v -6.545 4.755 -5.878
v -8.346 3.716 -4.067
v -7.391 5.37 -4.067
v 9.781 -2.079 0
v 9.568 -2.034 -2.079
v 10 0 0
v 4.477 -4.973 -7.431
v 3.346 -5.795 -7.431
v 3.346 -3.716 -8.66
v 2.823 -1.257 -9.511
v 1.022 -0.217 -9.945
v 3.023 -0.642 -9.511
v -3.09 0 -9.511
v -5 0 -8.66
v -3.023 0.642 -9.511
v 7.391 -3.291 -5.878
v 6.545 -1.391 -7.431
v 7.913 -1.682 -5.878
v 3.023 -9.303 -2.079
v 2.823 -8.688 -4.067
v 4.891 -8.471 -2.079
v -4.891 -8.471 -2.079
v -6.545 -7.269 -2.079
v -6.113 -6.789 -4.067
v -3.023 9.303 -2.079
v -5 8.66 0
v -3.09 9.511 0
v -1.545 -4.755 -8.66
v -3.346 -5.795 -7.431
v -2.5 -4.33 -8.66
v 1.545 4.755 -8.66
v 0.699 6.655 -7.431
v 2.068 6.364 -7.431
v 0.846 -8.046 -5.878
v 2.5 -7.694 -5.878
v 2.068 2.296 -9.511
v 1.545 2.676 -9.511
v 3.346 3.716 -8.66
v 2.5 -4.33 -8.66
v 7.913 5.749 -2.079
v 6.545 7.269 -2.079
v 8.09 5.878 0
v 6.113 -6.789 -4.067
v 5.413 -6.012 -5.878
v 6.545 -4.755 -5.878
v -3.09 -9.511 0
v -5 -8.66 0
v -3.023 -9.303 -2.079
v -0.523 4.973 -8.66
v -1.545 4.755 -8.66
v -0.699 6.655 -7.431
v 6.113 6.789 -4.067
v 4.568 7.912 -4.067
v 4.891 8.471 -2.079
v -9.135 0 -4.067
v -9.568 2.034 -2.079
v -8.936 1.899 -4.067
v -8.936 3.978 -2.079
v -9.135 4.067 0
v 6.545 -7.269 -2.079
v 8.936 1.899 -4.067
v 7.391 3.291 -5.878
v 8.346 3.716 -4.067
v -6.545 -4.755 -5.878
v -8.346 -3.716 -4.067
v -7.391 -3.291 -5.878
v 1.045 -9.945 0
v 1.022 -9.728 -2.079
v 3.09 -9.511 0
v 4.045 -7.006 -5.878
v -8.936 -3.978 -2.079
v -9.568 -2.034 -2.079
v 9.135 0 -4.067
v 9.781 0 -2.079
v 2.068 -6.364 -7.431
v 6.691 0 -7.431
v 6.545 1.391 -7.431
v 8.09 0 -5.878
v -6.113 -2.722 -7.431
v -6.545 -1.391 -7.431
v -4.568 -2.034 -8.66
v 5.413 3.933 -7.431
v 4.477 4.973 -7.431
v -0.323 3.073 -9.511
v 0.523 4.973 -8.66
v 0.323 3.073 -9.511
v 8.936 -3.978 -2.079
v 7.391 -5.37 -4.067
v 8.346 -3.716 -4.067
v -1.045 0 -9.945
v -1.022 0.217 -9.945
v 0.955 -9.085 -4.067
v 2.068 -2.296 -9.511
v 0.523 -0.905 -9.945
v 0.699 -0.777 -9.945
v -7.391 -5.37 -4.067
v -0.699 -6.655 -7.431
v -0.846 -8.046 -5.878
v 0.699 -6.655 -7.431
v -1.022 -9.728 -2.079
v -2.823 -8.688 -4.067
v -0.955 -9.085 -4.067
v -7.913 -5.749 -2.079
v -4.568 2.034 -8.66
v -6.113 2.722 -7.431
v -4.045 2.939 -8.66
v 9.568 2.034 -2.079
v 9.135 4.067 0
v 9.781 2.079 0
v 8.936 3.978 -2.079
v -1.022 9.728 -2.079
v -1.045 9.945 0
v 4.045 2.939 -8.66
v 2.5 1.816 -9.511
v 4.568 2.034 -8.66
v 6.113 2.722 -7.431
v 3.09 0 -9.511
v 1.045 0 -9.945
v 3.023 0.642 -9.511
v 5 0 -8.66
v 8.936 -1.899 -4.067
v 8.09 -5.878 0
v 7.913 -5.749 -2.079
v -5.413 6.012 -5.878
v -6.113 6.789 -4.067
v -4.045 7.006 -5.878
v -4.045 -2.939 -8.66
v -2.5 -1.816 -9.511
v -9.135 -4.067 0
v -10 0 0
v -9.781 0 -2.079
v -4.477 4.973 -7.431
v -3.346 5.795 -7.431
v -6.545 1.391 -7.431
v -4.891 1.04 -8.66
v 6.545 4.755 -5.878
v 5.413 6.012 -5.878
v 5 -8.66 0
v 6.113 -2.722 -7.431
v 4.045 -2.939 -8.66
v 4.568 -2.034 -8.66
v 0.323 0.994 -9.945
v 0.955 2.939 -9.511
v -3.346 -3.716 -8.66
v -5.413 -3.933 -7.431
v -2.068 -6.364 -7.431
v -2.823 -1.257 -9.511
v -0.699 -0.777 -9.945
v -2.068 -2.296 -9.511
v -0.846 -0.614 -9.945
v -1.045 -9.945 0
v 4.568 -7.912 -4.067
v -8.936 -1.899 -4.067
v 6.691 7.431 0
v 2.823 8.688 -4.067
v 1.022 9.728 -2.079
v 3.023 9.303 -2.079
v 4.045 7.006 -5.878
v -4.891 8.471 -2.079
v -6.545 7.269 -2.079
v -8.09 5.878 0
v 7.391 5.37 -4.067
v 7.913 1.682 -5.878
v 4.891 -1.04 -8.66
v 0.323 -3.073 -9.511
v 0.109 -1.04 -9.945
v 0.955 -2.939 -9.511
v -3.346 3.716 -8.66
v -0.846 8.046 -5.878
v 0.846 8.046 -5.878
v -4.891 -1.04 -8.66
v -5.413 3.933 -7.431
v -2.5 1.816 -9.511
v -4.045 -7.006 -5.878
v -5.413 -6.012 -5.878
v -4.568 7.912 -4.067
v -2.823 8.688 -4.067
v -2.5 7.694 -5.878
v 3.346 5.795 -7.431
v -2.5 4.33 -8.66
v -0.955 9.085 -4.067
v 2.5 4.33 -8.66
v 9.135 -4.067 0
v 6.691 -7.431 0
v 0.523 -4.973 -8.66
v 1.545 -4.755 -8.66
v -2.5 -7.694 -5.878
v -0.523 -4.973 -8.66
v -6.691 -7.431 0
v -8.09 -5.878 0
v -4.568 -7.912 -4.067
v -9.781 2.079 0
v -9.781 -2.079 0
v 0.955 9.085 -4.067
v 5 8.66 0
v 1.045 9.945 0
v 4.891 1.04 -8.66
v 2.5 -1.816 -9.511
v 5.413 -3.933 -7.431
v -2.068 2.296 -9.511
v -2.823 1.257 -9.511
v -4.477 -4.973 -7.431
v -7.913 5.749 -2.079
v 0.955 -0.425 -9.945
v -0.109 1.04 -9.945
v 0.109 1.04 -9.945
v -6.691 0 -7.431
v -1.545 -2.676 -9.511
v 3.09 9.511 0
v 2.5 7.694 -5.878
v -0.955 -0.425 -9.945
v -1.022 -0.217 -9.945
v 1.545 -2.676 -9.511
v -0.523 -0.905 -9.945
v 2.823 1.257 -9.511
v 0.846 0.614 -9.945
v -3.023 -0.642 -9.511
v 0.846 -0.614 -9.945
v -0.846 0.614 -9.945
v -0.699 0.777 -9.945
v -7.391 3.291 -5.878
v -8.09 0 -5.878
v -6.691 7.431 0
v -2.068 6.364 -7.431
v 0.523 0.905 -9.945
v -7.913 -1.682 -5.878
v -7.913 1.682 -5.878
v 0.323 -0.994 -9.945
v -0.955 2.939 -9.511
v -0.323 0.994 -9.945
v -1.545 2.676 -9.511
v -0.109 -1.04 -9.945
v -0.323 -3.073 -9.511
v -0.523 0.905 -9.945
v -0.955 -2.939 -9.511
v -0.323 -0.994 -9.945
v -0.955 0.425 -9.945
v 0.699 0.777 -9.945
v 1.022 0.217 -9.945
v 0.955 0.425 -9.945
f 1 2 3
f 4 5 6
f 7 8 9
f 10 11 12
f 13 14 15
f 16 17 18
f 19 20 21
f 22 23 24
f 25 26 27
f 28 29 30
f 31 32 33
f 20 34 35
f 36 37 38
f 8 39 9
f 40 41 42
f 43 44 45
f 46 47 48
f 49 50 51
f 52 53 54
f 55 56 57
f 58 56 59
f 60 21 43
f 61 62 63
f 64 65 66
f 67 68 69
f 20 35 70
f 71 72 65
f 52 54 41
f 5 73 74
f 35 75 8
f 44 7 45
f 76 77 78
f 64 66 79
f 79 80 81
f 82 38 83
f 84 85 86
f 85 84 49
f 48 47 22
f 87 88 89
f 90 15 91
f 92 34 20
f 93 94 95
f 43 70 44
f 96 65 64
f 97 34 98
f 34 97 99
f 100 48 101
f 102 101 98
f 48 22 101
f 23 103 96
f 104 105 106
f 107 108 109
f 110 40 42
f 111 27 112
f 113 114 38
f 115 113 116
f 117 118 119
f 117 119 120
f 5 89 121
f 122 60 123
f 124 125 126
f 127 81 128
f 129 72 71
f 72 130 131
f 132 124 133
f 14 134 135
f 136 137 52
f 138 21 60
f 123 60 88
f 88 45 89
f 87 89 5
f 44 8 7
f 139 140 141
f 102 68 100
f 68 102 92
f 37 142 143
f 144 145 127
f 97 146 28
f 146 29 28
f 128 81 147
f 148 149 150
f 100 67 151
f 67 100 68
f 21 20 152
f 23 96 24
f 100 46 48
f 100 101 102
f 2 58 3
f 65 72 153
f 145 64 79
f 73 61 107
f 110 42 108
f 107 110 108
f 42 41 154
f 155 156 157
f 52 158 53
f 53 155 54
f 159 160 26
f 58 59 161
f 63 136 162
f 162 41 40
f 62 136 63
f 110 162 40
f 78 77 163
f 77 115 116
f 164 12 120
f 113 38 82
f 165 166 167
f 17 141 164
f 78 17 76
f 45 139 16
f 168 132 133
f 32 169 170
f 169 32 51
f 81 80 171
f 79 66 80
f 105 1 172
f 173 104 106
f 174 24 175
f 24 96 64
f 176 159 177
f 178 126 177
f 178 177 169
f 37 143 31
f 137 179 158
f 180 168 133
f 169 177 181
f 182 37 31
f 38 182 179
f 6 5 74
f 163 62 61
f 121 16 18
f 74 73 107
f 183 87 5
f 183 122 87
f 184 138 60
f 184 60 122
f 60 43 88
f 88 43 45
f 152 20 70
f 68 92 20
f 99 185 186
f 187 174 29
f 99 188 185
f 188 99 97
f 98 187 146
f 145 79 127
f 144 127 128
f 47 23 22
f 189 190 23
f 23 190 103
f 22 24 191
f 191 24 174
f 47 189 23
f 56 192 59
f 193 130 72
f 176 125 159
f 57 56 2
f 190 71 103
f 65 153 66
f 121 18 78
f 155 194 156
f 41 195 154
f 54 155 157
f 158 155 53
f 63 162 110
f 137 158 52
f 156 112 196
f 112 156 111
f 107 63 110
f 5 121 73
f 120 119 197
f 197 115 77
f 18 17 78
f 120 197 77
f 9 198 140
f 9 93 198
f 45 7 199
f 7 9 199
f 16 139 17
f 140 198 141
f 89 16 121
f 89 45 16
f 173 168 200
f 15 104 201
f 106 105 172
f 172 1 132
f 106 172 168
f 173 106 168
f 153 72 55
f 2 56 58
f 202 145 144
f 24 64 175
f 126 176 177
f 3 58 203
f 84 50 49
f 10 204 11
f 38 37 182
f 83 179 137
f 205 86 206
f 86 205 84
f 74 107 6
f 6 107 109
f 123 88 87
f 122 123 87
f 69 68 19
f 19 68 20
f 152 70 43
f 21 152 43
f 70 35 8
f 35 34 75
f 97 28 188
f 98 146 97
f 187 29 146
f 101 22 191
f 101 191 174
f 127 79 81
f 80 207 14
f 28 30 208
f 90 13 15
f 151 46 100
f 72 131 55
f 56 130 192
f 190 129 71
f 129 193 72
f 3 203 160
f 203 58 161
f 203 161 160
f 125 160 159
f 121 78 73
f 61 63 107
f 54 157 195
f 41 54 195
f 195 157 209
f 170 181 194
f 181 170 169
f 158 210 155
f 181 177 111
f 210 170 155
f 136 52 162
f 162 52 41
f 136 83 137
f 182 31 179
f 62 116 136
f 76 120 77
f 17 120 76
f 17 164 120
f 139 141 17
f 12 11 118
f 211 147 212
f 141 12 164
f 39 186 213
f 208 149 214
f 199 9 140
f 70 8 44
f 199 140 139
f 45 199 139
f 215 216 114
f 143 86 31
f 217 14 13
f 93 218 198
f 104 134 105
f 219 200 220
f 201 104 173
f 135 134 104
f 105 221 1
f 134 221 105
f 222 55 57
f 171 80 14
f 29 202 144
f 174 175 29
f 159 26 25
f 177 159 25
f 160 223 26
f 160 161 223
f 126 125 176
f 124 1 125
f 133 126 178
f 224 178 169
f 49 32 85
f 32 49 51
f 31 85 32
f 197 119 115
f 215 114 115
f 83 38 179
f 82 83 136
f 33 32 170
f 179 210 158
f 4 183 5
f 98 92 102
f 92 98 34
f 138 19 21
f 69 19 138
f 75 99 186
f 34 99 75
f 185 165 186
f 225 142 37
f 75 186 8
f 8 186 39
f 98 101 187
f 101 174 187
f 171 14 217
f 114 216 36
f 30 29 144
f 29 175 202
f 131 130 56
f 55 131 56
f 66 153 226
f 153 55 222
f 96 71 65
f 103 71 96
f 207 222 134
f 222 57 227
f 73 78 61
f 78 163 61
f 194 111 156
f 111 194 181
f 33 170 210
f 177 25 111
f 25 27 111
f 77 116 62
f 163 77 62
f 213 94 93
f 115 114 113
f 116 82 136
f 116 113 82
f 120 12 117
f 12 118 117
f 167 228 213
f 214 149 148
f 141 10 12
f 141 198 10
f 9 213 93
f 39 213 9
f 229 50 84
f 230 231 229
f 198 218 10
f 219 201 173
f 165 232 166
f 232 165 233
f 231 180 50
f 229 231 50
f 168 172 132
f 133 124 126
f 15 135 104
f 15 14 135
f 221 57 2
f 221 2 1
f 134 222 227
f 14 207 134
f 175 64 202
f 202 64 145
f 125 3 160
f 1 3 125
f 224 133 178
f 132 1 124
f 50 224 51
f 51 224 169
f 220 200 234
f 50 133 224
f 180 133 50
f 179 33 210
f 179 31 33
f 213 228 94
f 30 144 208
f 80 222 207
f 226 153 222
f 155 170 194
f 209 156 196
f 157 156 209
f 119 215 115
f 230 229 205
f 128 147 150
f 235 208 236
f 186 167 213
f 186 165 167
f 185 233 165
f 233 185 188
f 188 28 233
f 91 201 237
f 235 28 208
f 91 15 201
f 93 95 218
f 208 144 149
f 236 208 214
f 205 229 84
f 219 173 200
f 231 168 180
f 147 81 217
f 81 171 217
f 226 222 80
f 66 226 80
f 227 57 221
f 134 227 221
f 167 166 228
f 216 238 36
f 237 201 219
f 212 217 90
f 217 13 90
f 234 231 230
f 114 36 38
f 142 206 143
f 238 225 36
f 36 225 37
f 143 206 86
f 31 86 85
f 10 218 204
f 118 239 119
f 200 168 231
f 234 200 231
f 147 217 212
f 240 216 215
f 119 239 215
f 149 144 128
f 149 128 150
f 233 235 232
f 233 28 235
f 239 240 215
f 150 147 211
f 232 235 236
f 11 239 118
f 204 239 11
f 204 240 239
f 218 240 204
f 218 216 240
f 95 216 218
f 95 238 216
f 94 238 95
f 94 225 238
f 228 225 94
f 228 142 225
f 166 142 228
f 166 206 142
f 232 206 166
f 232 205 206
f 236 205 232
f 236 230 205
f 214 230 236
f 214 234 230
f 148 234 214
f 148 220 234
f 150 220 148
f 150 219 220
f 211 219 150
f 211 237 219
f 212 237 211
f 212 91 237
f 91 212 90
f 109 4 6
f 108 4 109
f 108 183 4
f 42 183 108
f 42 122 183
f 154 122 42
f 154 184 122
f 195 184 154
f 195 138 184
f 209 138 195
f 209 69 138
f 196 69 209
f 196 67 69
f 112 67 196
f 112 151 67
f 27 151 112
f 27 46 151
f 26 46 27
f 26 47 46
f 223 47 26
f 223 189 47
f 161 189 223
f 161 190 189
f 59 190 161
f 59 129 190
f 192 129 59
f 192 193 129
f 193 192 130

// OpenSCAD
difference() {
    sphere(10);
    translate([-10, -10, 0]) cube([20, 20, 20]);
}
